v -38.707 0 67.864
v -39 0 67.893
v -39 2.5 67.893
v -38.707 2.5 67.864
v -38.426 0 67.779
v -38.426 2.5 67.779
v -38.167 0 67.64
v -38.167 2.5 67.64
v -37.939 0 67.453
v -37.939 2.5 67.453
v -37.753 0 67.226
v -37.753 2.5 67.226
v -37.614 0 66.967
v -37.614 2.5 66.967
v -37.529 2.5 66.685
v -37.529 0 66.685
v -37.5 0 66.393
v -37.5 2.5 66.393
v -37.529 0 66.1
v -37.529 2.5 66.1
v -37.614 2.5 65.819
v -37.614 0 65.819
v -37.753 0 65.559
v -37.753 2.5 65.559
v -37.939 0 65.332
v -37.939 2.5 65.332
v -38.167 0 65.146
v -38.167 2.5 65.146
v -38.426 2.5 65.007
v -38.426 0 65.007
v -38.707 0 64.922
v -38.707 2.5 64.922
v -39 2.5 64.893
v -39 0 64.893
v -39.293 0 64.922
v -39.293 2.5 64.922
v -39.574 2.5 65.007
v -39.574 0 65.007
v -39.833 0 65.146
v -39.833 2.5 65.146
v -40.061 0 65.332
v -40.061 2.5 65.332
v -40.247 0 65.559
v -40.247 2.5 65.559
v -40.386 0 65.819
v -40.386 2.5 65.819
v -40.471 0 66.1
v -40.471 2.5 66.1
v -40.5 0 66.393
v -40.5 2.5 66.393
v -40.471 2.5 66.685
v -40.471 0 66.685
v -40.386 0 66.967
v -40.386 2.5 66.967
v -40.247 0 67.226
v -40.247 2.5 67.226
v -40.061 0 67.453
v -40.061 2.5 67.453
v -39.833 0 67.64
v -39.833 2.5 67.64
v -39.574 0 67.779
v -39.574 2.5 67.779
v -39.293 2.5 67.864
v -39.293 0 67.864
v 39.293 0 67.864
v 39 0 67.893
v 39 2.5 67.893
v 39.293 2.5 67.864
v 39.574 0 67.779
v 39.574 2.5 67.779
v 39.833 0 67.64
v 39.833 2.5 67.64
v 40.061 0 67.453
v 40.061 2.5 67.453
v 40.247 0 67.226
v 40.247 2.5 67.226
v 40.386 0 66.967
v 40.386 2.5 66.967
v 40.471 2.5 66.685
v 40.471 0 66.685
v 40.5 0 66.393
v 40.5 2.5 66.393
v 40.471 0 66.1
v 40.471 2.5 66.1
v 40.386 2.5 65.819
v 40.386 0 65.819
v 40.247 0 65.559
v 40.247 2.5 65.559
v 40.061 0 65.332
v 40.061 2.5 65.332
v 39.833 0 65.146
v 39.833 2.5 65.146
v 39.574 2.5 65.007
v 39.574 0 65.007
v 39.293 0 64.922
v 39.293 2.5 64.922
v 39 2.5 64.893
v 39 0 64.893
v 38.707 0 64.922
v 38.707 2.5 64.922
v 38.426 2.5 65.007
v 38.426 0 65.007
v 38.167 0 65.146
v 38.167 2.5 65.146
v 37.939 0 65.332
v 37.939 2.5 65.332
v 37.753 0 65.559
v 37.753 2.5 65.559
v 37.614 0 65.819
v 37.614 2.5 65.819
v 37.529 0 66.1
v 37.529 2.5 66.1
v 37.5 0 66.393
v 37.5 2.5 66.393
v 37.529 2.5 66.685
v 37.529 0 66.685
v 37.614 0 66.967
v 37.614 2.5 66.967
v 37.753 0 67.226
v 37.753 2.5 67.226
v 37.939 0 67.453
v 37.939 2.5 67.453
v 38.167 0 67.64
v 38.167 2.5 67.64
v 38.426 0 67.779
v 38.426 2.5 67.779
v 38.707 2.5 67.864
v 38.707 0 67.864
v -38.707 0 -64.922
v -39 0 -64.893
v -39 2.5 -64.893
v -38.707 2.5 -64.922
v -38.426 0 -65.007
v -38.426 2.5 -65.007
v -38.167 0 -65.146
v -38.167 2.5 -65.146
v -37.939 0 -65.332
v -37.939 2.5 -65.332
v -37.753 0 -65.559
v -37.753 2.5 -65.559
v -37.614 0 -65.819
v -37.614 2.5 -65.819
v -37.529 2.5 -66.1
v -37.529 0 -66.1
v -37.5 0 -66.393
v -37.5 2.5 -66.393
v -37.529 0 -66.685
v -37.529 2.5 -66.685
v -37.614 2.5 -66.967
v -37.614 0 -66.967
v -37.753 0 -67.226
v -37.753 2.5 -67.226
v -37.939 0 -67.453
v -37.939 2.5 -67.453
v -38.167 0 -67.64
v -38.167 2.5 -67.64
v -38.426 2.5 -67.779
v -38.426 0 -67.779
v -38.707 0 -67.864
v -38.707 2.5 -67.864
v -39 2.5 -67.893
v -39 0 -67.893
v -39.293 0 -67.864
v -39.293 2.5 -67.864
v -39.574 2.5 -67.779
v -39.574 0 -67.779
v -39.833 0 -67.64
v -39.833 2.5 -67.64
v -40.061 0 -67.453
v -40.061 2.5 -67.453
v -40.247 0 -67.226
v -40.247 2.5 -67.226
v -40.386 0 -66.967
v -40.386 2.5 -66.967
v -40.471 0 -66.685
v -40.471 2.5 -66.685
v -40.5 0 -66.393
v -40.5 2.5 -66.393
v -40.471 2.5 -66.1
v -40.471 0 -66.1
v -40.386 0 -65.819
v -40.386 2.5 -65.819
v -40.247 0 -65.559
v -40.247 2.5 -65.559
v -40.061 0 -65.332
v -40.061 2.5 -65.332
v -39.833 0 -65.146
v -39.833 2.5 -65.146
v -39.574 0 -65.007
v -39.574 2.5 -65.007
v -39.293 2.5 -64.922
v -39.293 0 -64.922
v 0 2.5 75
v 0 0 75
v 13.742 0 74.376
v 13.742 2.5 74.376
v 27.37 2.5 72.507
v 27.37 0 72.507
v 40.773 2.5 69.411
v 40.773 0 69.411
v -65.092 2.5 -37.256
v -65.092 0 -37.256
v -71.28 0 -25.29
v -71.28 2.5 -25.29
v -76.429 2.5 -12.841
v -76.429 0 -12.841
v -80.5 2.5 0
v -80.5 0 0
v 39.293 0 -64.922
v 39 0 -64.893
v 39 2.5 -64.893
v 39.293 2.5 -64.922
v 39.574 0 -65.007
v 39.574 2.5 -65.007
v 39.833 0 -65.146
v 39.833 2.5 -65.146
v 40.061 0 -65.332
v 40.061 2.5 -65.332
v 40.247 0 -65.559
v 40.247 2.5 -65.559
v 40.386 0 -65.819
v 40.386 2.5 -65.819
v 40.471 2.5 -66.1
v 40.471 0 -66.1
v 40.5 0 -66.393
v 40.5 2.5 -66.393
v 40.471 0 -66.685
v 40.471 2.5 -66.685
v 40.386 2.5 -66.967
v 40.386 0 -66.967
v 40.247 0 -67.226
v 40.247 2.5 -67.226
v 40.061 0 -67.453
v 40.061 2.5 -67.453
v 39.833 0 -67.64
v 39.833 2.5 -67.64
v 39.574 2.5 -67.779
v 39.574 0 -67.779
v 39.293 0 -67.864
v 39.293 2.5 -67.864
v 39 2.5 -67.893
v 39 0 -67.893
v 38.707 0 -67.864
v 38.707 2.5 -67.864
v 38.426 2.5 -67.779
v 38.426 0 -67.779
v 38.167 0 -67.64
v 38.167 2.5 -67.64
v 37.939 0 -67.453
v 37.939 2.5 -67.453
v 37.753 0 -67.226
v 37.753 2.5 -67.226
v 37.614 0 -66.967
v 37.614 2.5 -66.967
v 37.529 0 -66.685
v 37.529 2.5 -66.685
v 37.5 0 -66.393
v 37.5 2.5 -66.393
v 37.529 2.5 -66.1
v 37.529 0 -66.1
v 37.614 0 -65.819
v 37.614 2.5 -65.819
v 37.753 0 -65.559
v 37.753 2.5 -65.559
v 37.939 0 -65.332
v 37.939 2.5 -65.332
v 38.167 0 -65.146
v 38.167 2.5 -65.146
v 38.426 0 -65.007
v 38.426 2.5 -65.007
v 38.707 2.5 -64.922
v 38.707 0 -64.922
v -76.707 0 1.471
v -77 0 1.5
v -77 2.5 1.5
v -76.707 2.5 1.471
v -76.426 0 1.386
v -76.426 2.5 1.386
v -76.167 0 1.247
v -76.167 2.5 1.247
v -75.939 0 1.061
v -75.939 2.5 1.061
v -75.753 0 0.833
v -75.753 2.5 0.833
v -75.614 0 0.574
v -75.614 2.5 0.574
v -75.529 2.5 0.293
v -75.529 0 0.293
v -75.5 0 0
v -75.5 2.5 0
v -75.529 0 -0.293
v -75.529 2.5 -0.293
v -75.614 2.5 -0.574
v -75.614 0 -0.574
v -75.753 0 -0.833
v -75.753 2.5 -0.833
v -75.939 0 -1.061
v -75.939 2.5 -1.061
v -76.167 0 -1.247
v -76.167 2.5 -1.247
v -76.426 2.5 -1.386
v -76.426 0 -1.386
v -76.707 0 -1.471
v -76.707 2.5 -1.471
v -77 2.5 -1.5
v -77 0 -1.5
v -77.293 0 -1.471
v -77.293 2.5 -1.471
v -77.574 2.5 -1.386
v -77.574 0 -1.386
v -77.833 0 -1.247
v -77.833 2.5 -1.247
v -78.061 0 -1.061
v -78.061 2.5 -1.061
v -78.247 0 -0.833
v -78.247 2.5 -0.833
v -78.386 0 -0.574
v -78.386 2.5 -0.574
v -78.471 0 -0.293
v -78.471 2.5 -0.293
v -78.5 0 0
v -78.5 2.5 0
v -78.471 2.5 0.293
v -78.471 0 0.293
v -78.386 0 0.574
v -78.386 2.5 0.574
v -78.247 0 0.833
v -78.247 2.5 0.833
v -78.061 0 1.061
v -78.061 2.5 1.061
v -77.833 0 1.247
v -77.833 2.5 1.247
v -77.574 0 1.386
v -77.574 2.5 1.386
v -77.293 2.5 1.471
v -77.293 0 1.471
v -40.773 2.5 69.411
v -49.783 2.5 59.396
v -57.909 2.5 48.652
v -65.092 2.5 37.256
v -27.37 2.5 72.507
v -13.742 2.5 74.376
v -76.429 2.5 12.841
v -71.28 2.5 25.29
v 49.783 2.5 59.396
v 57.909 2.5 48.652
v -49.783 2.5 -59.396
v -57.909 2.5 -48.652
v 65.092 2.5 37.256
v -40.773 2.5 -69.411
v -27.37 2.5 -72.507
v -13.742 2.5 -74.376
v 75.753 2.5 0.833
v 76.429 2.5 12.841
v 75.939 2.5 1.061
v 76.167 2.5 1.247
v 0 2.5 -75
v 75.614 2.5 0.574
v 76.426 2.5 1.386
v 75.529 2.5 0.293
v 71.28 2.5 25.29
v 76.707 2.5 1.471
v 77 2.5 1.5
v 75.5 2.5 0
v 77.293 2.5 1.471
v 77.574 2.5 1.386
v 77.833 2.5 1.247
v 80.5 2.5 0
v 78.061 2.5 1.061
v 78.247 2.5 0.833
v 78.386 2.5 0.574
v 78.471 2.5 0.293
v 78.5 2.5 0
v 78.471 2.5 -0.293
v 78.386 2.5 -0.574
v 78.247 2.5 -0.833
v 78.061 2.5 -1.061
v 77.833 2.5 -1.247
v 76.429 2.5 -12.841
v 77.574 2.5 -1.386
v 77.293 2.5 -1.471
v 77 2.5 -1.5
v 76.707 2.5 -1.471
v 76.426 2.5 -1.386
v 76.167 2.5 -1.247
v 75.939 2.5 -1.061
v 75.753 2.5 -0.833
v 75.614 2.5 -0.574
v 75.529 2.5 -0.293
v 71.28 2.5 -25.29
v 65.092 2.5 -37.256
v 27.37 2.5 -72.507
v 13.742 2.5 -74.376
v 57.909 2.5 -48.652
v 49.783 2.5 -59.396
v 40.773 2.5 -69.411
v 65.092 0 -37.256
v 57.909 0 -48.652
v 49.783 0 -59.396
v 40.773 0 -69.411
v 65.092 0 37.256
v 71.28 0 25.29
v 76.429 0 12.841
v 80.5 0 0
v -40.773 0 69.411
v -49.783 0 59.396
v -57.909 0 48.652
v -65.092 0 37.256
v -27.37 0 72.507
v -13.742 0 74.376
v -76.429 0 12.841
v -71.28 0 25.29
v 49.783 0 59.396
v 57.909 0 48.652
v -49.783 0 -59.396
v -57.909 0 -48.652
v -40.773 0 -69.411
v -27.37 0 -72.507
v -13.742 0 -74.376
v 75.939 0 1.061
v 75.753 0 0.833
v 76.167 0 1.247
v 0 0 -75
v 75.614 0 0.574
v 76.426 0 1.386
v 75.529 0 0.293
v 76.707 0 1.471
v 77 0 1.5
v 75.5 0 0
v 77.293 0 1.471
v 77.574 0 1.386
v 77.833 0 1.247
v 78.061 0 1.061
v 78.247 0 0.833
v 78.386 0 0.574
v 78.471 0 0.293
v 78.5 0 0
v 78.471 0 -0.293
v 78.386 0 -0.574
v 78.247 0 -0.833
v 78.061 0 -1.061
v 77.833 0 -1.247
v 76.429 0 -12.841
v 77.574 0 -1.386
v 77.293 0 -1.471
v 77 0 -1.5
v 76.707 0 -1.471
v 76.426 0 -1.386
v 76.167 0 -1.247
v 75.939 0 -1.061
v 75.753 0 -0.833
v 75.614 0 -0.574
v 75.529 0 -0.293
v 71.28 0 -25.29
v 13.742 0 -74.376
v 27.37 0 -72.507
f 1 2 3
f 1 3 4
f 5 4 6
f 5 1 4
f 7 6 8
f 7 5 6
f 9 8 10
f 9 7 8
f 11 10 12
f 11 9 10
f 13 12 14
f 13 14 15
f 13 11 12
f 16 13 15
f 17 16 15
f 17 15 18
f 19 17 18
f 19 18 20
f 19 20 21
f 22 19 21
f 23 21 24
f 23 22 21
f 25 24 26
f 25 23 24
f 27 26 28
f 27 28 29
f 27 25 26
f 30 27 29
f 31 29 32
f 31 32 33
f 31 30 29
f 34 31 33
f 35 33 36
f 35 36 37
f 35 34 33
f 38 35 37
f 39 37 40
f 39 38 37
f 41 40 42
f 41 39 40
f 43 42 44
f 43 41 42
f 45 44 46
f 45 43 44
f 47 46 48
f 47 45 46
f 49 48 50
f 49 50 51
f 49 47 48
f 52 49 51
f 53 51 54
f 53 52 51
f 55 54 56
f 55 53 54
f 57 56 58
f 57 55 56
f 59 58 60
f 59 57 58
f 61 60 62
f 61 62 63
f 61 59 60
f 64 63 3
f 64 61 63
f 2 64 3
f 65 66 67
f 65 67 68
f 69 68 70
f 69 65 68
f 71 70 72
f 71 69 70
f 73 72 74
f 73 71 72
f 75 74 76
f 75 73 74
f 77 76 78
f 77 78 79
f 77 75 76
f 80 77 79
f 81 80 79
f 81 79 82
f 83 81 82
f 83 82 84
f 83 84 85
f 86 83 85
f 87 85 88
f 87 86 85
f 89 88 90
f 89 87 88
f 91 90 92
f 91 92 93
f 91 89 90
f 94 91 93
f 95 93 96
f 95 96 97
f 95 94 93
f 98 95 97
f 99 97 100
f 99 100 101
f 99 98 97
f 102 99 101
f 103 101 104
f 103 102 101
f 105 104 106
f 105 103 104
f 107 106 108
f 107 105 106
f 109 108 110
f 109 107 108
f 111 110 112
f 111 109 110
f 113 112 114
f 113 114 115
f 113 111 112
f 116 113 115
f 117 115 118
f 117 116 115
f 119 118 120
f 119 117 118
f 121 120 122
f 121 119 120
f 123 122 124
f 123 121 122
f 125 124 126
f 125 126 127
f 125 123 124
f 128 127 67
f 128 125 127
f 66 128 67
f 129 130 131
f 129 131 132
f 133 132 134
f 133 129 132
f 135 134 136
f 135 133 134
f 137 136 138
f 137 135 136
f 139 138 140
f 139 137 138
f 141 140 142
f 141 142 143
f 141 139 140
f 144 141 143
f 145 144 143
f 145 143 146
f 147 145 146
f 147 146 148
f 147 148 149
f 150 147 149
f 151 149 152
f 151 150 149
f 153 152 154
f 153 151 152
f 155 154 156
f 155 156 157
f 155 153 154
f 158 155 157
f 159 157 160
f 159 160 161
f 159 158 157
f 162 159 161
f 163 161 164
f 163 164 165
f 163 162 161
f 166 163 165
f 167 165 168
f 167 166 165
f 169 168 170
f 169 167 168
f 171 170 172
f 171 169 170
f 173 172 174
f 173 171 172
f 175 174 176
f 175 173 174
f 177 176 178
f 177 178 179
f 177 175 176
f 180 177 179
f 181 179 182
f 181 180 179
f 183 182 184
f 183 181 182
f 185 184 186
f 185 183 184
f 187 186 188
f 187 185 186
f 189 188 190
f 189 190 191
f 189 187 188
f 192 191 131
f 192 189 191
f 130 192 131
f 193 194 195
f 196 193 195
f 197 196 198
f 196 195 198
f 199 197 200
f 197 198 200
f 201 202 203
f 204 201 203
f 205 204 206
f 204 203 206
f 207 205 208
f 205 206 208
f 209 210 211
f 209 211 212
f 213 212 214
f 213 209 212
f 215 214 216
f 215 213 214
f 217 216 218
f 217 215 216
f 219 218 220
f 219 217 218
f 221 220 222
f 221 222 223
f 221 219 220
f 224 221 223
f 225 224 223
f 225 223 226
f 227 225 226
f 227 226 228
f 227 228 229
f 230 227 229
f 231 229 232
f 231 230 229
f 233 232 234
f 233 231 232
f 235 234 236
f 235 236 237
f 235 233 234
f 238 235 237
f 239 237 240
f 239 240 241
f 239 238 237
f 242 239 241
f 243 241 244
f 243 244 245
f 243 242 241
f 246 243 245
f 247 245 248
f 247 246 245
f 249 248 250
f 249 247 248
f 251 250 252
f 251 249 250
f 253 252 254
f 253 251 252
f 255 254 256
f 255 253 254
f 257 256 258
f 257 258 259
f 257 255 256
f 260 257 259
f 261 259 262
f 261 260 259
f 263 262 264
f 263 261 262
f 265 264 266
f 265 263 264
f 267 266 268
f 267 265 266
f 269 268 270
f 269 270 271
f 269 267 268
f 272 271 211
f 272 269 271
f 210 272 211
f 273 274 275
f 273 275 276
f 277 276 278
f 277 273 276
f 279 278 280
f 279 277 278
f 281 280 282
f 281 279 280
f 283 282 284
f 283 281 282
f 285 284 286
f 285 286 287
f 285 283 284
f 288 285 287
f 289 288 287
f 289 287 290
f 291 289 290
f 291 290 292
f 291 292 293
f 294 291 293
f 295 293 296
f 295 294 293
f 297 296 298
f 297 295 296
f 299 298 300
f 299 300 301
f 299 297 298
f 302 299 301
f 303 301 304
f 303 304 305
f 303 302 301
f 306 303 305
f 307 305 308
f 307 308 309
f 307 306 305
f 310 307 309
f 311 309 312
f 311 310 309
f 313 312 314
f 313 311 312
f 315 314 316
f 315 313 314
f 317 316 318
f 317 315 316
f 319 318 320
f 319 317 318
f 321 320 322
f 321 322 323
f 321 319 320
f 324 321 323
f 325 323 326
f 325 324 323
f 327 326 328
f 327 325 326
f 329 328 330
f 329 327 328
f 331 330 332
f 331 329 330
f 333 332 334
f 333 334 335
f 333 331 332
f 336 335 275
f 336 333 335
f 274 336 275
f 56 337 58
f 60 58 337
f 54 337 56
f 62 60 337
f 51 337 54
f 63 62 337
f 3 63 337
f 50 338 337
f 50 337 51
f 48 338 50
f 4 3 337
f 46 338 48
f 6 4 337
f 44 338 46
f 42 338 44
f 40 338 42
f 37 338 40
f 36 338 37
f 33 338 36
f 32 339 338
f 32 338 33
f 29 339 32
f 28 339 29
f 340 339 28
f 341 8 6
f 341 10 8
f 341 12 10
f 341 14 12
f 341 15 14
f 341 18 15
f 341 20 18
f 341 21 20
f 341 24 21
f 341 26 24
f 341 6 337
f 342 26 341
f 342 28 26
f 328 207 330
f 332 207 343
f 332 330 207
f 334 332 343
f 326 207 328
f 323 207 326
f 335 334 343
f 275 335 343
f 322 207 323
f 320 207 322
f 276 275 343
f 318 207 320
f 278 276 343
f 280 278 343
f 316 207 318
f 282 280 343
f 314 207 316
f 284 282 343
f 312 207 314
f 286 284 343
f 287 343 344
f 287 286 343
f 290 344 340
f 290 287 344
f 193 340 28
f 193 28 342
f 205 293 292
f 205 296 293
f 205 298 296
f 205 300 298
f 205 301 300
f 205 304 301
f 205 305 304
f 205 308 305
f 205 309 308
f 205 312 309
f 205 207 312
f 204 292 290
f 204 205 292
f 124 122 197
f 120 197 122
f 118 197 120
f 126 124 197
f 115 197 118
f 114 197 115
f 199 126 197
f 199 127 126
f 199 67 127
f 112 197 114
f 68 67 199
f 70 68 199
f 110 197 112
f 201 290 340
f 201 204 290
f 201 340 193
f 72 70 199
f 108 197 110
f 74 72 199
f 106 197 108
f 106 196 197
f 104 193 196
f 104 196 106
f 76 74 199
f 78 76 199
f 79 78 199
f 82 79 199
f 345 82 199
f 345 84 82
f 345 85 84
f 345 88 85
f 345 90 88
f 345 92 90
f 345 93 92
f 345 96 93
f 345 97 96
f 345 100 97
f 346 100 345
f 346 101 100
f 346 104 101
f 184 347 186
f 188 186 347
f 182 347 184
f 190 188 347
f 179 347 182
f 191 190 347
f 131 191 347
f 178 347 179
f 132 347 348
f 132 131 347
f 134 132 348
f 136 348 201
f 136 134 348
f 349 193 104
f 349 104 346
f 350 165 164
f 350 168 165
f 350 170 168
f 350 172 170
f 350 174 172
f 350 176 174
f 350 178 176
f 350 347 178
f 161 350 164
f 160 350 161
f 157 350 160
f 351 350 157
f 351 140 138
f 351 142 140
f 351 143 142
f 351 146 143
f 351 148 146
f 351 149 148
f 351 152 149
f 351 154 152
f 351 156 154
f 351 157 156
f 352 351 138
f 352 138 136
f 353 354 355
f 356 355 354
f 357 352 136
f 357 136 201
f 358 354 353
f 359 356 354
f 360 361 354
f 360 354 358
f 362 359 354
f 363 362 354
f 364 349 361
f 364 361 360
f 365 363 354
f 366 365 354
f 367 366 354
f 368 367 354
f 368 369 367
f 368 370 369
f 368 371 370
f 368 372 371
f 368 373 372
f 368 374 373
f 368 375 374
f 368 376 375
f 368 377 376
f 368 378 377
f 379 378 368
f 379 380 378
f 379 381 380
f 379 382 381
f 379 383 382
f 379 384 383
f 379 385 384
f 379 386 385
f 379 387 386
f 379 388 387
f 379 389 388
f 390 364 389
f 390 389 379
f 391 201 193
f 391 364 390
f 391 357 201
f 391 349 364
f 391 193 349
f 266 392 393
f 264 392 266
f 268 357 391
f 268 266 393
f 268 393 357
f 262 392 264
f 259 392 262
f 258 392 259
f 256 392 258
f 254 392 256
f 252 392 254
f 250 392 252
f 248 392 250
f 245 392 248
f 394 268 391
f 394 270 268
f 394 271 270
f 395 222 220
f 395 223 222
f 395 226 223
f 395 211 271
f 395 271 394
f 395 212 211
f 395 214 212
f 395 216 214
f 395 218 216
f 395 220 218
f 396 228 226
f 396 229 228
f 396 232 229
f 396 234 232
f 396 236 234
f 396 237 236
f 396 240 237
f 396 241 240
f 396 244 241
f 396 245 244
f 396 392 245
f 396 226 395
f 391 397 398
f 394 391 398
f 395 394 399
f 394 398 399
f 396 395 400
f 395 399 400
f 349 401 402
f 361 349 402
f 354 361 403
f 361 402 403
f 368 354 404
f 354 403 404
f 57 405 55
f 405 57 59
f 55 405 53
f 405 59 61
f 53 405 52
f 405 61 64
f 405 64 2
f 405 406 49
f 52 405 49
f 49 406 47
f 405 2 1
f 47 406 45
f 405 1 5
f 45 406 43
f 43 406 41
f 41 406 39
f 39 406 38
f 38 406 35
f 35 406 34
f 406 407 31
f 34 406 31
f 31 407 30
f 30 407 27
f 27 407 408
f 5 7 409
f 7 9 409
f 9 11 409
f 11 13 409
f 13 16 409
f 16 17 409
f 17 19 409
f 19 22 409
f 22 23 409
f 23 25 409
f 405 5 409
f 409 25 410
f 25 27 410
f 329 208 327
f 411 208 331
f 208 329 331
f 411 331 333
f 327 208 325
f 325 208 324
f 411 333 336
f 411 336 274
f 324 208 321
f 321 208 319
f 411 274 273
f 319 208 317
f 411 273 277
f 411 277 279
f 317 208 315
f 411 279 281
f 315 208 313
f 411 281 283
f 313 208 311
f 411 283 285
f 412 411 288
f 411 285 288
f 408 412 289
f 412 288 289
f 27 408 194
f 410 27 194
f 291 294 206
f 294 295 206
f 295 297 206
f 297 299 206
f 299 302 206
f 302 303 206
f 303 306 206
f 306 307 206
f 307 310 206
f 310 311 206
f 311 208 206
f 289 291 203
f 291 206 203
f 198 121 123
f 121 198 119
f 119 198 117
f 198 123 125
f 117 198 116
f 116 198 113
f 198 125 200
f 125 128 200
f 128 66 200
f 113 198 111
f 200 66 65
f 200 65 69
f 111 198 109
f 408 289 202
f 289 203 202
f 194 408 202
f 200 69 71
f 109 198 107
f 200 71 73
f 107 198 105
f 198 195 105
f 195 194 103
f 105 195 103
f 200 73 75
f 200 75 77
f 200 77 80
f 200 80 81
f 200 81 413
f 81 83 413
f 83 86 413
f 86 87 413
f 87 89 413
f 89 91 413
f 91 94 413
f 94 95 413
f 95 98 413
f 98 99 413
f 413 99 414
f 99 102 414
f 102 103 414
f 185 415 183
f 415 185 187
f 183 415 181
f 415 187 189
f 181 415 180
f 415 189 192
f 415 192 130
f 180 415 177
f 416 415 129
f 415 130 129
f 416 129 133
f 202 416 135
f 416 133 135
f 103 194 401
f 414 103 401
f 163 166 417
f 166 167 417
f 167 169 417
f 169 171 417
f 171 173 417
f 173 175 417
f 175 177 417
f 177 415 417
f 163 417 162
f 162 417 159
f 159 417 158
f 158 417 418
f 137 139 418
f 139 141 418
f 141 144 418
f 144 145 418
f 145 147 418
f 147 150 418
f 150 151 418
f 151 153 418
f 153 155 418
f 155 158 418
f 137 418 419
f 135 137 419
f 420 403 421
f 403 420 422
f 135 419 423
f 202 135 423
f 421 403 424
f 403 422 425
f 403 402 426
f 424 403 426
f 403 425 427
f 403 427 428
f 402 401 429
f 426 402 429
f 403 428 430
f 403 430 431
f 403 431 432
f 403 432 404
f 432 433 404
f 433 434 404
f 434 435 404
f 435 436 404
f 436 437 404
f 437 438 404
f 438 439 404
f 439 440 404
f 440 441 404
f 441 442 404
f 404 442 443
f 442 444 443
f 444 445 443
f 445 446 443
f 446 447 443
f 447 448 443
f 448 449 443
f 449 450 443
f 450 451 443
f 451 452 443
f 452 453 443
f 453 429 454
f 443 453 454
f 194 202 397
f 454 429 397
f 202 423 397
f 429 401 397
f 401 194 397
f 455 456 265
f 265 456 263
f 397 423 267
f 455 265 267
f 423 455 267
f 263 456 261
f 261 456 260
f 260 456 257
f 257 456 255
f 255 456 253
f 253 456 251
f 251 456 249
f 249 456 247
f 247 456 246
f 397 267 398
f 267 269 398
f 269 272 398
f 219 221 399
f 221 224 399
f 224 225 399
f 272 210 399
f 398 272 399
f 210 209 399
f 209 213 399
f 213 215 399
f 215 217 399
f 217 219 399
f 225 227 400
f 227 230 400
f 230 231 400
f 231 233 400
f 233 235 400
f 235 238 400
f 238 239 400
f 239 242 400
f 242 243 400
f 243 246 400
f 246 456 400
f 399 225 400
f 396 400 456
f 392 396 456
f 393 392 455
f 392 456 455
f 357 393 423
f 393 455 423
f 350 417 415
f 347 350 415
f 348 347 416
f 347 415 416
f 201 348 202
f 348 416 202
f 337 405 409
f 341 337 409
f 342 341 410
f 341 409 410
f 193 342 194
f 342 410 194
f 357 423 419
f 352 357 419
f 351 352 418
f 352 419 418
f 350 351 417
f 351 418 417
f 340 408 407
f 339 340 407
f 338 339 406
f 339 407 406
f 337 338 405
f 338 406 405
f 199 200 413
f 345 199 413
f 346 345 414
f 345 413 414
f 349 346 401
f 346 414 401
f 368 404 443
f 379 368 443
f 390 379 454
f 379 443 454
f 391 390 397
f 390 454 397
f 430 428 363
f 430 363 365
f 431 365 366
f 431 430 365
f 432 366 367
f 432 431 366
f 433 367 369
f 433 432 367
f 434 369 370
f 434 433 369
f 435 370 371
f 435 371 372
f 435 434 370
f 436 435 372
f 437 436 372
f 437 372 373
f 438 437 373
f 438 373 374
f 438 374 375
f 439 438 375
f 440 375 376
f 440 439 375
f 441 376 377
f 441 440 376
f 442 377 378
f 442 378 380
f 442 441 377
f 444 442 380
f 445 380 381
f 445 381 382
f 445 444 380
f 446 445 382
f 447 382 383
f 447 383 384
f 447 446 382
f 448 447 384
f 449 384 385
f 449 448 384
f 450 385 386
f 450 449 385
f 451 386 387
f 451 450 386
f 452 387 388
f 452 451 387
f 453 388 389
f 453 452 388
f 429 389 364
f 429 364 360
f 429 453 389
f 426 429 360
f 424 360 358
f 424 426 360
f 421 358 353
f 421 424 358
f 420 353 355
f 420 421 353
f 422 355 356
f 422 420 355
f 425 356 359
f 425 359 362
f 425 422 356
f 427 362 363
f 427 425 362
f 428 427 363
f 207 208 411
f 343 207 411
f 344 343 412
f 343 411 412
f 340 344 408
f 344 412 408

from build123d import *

# Parameters (mm, degrees)
SKETCH1_R           = 75
SKETCH1_R_2         = 73.5
SKETCH1_R_3         = 1.5
BOSS_EXTRUDE1_DEPTH = 2.5


with BuildPart() as part:
    # Sketch1 → Boss-Extrude1 (new body)
    with BuildSketch(Plane(origin=(0, 0, 0), x_dir=(1, 0, 0), z_dir=(0, 1, 0))):
        Circle(SKETCH1_R)
        Circle(SKETCH1_R_2, mode=Mode.SUBTRACT)
        Circle(SKETCH1_R_2)
        with BuildLine():
            ThreePointArc((-65.092339325, -37.255702398), (-75, -1.885e-06), (-65.092341198, 37.255699125))
            ThreePointArc((-65.092341198, 37.255699125), (-73.987141009, 19.120393419), (-80.5, 0))
            ThreePointArc((-80.5, 0), (-73.987140288, -19.120395161), (-65.092339325, -37.255702398))
        make_face()
        with Locations(Location((-77, 0, 0), (0, 0, 270))):
            Circle(SKETCH1_R_3, mode=Mode.SUBTRACT)
        with BuildLine():
            ThreePointArc((-40.772727273, -69.410623904), (-20.577028262, -73.596152049), (5.64e-07, -75))
            ThreePointArc((5.64e-07, -75), (-37.621950265, -64.881344455), (-65.092339325, -37.255702398))
            ThreePointArc((-65.092339325, -37.255702398), (-53.960444579, -54.110599462), (-40.772727273, -69.410623904))
        make_face()
        with Locations(Location((-39, -66.392770691, 0), (0, 0, 270))):
            Circle(SKETCH1_R_3, mode=Mode.SUBTRACT)
        with BuildLine():
            ThreePointArc((40.772727273, -69.410623904), (53.960444658, -54.110599358), (65.092339455, -37.255702172))
            ThreePointArc((65.092339455, -37.255702172), (37.621950865, -64.881344107), (5.64e-07, -75))
            ThreePointArc((5.64e-07, -75), (20.577028821, -73.596151973), (40.772727273, -69.410623904))
        make_face()
        with Locations(Location((39, -66.392770691, 0), (0, 0, 270))):
            Circle(SKETCH1_R_3, mode=Mode.SUBTRACT)
        with BuildLine():
            ThreePointArc((65.092339583, 37.255701948), (72.480774929, 19.27530196), (75, 0))
            ThreePointArc((75, 0), (72.480774896, -19.275302084), (65.092339455, -37.255702172))
            ThreePointArc((65.092339455, -37.255702172), (73.987140338, -19.120395041), (80.5, 0))
            ThreePointArc((80.5, 0), (73.987140387, 19.120394921), (65.092339583, 37.255701948))
        make_face()
        with Locations(Location((77, 0, 0), (0, 0, 270))):
            Circle(SKETCH1_R_3, mode=Mode.SUBTRACT)
        with BuildLine():
            ThreePointArc((-4.58e-07, 75), (37.621950535, 64.881344298), (65.092339583, 37.255701948))
            ThreePointArc((65.092339583, 37.255701948), (53.960444736, 54.110599255), (40.772727273, 69.410623904))
            ThreePointArc((40.772727273, 69.410623904), (20.577028315, 73.596152042), (-4.58e-07, 75))
        make_face()
        with Locations(Location((39, 66.392770691, 0), (0, 0, 270))):
            Circle(SKETCH1_R_3, mode=Mode.SUBTRACT)
        with BuildLine():
            ThreePointArc((-65.092341198, 37.255699125), (-37.621952338, 64.881343253), (-4.58e-07, 75))
            ThreePointArc((-4.58e-07, 75), (-20.577028768, 73.59615198), (-40.772727273, 69.410623904))
            ThreePointArc((-40.772727273, 69.410623904), (-53.960445716, 54.110597958), (-65.092341198, 37.255699125))
        make_face()
        with Locations(Location((-39, 66.392770691, 0), (0, 0, 270))):
            Circle(SKETCH1_R_3, mode=Mode.SUBTRACT)
    extrude(amount=BOSS_EXTRUDE1_DEPTH)


solid = part.part
